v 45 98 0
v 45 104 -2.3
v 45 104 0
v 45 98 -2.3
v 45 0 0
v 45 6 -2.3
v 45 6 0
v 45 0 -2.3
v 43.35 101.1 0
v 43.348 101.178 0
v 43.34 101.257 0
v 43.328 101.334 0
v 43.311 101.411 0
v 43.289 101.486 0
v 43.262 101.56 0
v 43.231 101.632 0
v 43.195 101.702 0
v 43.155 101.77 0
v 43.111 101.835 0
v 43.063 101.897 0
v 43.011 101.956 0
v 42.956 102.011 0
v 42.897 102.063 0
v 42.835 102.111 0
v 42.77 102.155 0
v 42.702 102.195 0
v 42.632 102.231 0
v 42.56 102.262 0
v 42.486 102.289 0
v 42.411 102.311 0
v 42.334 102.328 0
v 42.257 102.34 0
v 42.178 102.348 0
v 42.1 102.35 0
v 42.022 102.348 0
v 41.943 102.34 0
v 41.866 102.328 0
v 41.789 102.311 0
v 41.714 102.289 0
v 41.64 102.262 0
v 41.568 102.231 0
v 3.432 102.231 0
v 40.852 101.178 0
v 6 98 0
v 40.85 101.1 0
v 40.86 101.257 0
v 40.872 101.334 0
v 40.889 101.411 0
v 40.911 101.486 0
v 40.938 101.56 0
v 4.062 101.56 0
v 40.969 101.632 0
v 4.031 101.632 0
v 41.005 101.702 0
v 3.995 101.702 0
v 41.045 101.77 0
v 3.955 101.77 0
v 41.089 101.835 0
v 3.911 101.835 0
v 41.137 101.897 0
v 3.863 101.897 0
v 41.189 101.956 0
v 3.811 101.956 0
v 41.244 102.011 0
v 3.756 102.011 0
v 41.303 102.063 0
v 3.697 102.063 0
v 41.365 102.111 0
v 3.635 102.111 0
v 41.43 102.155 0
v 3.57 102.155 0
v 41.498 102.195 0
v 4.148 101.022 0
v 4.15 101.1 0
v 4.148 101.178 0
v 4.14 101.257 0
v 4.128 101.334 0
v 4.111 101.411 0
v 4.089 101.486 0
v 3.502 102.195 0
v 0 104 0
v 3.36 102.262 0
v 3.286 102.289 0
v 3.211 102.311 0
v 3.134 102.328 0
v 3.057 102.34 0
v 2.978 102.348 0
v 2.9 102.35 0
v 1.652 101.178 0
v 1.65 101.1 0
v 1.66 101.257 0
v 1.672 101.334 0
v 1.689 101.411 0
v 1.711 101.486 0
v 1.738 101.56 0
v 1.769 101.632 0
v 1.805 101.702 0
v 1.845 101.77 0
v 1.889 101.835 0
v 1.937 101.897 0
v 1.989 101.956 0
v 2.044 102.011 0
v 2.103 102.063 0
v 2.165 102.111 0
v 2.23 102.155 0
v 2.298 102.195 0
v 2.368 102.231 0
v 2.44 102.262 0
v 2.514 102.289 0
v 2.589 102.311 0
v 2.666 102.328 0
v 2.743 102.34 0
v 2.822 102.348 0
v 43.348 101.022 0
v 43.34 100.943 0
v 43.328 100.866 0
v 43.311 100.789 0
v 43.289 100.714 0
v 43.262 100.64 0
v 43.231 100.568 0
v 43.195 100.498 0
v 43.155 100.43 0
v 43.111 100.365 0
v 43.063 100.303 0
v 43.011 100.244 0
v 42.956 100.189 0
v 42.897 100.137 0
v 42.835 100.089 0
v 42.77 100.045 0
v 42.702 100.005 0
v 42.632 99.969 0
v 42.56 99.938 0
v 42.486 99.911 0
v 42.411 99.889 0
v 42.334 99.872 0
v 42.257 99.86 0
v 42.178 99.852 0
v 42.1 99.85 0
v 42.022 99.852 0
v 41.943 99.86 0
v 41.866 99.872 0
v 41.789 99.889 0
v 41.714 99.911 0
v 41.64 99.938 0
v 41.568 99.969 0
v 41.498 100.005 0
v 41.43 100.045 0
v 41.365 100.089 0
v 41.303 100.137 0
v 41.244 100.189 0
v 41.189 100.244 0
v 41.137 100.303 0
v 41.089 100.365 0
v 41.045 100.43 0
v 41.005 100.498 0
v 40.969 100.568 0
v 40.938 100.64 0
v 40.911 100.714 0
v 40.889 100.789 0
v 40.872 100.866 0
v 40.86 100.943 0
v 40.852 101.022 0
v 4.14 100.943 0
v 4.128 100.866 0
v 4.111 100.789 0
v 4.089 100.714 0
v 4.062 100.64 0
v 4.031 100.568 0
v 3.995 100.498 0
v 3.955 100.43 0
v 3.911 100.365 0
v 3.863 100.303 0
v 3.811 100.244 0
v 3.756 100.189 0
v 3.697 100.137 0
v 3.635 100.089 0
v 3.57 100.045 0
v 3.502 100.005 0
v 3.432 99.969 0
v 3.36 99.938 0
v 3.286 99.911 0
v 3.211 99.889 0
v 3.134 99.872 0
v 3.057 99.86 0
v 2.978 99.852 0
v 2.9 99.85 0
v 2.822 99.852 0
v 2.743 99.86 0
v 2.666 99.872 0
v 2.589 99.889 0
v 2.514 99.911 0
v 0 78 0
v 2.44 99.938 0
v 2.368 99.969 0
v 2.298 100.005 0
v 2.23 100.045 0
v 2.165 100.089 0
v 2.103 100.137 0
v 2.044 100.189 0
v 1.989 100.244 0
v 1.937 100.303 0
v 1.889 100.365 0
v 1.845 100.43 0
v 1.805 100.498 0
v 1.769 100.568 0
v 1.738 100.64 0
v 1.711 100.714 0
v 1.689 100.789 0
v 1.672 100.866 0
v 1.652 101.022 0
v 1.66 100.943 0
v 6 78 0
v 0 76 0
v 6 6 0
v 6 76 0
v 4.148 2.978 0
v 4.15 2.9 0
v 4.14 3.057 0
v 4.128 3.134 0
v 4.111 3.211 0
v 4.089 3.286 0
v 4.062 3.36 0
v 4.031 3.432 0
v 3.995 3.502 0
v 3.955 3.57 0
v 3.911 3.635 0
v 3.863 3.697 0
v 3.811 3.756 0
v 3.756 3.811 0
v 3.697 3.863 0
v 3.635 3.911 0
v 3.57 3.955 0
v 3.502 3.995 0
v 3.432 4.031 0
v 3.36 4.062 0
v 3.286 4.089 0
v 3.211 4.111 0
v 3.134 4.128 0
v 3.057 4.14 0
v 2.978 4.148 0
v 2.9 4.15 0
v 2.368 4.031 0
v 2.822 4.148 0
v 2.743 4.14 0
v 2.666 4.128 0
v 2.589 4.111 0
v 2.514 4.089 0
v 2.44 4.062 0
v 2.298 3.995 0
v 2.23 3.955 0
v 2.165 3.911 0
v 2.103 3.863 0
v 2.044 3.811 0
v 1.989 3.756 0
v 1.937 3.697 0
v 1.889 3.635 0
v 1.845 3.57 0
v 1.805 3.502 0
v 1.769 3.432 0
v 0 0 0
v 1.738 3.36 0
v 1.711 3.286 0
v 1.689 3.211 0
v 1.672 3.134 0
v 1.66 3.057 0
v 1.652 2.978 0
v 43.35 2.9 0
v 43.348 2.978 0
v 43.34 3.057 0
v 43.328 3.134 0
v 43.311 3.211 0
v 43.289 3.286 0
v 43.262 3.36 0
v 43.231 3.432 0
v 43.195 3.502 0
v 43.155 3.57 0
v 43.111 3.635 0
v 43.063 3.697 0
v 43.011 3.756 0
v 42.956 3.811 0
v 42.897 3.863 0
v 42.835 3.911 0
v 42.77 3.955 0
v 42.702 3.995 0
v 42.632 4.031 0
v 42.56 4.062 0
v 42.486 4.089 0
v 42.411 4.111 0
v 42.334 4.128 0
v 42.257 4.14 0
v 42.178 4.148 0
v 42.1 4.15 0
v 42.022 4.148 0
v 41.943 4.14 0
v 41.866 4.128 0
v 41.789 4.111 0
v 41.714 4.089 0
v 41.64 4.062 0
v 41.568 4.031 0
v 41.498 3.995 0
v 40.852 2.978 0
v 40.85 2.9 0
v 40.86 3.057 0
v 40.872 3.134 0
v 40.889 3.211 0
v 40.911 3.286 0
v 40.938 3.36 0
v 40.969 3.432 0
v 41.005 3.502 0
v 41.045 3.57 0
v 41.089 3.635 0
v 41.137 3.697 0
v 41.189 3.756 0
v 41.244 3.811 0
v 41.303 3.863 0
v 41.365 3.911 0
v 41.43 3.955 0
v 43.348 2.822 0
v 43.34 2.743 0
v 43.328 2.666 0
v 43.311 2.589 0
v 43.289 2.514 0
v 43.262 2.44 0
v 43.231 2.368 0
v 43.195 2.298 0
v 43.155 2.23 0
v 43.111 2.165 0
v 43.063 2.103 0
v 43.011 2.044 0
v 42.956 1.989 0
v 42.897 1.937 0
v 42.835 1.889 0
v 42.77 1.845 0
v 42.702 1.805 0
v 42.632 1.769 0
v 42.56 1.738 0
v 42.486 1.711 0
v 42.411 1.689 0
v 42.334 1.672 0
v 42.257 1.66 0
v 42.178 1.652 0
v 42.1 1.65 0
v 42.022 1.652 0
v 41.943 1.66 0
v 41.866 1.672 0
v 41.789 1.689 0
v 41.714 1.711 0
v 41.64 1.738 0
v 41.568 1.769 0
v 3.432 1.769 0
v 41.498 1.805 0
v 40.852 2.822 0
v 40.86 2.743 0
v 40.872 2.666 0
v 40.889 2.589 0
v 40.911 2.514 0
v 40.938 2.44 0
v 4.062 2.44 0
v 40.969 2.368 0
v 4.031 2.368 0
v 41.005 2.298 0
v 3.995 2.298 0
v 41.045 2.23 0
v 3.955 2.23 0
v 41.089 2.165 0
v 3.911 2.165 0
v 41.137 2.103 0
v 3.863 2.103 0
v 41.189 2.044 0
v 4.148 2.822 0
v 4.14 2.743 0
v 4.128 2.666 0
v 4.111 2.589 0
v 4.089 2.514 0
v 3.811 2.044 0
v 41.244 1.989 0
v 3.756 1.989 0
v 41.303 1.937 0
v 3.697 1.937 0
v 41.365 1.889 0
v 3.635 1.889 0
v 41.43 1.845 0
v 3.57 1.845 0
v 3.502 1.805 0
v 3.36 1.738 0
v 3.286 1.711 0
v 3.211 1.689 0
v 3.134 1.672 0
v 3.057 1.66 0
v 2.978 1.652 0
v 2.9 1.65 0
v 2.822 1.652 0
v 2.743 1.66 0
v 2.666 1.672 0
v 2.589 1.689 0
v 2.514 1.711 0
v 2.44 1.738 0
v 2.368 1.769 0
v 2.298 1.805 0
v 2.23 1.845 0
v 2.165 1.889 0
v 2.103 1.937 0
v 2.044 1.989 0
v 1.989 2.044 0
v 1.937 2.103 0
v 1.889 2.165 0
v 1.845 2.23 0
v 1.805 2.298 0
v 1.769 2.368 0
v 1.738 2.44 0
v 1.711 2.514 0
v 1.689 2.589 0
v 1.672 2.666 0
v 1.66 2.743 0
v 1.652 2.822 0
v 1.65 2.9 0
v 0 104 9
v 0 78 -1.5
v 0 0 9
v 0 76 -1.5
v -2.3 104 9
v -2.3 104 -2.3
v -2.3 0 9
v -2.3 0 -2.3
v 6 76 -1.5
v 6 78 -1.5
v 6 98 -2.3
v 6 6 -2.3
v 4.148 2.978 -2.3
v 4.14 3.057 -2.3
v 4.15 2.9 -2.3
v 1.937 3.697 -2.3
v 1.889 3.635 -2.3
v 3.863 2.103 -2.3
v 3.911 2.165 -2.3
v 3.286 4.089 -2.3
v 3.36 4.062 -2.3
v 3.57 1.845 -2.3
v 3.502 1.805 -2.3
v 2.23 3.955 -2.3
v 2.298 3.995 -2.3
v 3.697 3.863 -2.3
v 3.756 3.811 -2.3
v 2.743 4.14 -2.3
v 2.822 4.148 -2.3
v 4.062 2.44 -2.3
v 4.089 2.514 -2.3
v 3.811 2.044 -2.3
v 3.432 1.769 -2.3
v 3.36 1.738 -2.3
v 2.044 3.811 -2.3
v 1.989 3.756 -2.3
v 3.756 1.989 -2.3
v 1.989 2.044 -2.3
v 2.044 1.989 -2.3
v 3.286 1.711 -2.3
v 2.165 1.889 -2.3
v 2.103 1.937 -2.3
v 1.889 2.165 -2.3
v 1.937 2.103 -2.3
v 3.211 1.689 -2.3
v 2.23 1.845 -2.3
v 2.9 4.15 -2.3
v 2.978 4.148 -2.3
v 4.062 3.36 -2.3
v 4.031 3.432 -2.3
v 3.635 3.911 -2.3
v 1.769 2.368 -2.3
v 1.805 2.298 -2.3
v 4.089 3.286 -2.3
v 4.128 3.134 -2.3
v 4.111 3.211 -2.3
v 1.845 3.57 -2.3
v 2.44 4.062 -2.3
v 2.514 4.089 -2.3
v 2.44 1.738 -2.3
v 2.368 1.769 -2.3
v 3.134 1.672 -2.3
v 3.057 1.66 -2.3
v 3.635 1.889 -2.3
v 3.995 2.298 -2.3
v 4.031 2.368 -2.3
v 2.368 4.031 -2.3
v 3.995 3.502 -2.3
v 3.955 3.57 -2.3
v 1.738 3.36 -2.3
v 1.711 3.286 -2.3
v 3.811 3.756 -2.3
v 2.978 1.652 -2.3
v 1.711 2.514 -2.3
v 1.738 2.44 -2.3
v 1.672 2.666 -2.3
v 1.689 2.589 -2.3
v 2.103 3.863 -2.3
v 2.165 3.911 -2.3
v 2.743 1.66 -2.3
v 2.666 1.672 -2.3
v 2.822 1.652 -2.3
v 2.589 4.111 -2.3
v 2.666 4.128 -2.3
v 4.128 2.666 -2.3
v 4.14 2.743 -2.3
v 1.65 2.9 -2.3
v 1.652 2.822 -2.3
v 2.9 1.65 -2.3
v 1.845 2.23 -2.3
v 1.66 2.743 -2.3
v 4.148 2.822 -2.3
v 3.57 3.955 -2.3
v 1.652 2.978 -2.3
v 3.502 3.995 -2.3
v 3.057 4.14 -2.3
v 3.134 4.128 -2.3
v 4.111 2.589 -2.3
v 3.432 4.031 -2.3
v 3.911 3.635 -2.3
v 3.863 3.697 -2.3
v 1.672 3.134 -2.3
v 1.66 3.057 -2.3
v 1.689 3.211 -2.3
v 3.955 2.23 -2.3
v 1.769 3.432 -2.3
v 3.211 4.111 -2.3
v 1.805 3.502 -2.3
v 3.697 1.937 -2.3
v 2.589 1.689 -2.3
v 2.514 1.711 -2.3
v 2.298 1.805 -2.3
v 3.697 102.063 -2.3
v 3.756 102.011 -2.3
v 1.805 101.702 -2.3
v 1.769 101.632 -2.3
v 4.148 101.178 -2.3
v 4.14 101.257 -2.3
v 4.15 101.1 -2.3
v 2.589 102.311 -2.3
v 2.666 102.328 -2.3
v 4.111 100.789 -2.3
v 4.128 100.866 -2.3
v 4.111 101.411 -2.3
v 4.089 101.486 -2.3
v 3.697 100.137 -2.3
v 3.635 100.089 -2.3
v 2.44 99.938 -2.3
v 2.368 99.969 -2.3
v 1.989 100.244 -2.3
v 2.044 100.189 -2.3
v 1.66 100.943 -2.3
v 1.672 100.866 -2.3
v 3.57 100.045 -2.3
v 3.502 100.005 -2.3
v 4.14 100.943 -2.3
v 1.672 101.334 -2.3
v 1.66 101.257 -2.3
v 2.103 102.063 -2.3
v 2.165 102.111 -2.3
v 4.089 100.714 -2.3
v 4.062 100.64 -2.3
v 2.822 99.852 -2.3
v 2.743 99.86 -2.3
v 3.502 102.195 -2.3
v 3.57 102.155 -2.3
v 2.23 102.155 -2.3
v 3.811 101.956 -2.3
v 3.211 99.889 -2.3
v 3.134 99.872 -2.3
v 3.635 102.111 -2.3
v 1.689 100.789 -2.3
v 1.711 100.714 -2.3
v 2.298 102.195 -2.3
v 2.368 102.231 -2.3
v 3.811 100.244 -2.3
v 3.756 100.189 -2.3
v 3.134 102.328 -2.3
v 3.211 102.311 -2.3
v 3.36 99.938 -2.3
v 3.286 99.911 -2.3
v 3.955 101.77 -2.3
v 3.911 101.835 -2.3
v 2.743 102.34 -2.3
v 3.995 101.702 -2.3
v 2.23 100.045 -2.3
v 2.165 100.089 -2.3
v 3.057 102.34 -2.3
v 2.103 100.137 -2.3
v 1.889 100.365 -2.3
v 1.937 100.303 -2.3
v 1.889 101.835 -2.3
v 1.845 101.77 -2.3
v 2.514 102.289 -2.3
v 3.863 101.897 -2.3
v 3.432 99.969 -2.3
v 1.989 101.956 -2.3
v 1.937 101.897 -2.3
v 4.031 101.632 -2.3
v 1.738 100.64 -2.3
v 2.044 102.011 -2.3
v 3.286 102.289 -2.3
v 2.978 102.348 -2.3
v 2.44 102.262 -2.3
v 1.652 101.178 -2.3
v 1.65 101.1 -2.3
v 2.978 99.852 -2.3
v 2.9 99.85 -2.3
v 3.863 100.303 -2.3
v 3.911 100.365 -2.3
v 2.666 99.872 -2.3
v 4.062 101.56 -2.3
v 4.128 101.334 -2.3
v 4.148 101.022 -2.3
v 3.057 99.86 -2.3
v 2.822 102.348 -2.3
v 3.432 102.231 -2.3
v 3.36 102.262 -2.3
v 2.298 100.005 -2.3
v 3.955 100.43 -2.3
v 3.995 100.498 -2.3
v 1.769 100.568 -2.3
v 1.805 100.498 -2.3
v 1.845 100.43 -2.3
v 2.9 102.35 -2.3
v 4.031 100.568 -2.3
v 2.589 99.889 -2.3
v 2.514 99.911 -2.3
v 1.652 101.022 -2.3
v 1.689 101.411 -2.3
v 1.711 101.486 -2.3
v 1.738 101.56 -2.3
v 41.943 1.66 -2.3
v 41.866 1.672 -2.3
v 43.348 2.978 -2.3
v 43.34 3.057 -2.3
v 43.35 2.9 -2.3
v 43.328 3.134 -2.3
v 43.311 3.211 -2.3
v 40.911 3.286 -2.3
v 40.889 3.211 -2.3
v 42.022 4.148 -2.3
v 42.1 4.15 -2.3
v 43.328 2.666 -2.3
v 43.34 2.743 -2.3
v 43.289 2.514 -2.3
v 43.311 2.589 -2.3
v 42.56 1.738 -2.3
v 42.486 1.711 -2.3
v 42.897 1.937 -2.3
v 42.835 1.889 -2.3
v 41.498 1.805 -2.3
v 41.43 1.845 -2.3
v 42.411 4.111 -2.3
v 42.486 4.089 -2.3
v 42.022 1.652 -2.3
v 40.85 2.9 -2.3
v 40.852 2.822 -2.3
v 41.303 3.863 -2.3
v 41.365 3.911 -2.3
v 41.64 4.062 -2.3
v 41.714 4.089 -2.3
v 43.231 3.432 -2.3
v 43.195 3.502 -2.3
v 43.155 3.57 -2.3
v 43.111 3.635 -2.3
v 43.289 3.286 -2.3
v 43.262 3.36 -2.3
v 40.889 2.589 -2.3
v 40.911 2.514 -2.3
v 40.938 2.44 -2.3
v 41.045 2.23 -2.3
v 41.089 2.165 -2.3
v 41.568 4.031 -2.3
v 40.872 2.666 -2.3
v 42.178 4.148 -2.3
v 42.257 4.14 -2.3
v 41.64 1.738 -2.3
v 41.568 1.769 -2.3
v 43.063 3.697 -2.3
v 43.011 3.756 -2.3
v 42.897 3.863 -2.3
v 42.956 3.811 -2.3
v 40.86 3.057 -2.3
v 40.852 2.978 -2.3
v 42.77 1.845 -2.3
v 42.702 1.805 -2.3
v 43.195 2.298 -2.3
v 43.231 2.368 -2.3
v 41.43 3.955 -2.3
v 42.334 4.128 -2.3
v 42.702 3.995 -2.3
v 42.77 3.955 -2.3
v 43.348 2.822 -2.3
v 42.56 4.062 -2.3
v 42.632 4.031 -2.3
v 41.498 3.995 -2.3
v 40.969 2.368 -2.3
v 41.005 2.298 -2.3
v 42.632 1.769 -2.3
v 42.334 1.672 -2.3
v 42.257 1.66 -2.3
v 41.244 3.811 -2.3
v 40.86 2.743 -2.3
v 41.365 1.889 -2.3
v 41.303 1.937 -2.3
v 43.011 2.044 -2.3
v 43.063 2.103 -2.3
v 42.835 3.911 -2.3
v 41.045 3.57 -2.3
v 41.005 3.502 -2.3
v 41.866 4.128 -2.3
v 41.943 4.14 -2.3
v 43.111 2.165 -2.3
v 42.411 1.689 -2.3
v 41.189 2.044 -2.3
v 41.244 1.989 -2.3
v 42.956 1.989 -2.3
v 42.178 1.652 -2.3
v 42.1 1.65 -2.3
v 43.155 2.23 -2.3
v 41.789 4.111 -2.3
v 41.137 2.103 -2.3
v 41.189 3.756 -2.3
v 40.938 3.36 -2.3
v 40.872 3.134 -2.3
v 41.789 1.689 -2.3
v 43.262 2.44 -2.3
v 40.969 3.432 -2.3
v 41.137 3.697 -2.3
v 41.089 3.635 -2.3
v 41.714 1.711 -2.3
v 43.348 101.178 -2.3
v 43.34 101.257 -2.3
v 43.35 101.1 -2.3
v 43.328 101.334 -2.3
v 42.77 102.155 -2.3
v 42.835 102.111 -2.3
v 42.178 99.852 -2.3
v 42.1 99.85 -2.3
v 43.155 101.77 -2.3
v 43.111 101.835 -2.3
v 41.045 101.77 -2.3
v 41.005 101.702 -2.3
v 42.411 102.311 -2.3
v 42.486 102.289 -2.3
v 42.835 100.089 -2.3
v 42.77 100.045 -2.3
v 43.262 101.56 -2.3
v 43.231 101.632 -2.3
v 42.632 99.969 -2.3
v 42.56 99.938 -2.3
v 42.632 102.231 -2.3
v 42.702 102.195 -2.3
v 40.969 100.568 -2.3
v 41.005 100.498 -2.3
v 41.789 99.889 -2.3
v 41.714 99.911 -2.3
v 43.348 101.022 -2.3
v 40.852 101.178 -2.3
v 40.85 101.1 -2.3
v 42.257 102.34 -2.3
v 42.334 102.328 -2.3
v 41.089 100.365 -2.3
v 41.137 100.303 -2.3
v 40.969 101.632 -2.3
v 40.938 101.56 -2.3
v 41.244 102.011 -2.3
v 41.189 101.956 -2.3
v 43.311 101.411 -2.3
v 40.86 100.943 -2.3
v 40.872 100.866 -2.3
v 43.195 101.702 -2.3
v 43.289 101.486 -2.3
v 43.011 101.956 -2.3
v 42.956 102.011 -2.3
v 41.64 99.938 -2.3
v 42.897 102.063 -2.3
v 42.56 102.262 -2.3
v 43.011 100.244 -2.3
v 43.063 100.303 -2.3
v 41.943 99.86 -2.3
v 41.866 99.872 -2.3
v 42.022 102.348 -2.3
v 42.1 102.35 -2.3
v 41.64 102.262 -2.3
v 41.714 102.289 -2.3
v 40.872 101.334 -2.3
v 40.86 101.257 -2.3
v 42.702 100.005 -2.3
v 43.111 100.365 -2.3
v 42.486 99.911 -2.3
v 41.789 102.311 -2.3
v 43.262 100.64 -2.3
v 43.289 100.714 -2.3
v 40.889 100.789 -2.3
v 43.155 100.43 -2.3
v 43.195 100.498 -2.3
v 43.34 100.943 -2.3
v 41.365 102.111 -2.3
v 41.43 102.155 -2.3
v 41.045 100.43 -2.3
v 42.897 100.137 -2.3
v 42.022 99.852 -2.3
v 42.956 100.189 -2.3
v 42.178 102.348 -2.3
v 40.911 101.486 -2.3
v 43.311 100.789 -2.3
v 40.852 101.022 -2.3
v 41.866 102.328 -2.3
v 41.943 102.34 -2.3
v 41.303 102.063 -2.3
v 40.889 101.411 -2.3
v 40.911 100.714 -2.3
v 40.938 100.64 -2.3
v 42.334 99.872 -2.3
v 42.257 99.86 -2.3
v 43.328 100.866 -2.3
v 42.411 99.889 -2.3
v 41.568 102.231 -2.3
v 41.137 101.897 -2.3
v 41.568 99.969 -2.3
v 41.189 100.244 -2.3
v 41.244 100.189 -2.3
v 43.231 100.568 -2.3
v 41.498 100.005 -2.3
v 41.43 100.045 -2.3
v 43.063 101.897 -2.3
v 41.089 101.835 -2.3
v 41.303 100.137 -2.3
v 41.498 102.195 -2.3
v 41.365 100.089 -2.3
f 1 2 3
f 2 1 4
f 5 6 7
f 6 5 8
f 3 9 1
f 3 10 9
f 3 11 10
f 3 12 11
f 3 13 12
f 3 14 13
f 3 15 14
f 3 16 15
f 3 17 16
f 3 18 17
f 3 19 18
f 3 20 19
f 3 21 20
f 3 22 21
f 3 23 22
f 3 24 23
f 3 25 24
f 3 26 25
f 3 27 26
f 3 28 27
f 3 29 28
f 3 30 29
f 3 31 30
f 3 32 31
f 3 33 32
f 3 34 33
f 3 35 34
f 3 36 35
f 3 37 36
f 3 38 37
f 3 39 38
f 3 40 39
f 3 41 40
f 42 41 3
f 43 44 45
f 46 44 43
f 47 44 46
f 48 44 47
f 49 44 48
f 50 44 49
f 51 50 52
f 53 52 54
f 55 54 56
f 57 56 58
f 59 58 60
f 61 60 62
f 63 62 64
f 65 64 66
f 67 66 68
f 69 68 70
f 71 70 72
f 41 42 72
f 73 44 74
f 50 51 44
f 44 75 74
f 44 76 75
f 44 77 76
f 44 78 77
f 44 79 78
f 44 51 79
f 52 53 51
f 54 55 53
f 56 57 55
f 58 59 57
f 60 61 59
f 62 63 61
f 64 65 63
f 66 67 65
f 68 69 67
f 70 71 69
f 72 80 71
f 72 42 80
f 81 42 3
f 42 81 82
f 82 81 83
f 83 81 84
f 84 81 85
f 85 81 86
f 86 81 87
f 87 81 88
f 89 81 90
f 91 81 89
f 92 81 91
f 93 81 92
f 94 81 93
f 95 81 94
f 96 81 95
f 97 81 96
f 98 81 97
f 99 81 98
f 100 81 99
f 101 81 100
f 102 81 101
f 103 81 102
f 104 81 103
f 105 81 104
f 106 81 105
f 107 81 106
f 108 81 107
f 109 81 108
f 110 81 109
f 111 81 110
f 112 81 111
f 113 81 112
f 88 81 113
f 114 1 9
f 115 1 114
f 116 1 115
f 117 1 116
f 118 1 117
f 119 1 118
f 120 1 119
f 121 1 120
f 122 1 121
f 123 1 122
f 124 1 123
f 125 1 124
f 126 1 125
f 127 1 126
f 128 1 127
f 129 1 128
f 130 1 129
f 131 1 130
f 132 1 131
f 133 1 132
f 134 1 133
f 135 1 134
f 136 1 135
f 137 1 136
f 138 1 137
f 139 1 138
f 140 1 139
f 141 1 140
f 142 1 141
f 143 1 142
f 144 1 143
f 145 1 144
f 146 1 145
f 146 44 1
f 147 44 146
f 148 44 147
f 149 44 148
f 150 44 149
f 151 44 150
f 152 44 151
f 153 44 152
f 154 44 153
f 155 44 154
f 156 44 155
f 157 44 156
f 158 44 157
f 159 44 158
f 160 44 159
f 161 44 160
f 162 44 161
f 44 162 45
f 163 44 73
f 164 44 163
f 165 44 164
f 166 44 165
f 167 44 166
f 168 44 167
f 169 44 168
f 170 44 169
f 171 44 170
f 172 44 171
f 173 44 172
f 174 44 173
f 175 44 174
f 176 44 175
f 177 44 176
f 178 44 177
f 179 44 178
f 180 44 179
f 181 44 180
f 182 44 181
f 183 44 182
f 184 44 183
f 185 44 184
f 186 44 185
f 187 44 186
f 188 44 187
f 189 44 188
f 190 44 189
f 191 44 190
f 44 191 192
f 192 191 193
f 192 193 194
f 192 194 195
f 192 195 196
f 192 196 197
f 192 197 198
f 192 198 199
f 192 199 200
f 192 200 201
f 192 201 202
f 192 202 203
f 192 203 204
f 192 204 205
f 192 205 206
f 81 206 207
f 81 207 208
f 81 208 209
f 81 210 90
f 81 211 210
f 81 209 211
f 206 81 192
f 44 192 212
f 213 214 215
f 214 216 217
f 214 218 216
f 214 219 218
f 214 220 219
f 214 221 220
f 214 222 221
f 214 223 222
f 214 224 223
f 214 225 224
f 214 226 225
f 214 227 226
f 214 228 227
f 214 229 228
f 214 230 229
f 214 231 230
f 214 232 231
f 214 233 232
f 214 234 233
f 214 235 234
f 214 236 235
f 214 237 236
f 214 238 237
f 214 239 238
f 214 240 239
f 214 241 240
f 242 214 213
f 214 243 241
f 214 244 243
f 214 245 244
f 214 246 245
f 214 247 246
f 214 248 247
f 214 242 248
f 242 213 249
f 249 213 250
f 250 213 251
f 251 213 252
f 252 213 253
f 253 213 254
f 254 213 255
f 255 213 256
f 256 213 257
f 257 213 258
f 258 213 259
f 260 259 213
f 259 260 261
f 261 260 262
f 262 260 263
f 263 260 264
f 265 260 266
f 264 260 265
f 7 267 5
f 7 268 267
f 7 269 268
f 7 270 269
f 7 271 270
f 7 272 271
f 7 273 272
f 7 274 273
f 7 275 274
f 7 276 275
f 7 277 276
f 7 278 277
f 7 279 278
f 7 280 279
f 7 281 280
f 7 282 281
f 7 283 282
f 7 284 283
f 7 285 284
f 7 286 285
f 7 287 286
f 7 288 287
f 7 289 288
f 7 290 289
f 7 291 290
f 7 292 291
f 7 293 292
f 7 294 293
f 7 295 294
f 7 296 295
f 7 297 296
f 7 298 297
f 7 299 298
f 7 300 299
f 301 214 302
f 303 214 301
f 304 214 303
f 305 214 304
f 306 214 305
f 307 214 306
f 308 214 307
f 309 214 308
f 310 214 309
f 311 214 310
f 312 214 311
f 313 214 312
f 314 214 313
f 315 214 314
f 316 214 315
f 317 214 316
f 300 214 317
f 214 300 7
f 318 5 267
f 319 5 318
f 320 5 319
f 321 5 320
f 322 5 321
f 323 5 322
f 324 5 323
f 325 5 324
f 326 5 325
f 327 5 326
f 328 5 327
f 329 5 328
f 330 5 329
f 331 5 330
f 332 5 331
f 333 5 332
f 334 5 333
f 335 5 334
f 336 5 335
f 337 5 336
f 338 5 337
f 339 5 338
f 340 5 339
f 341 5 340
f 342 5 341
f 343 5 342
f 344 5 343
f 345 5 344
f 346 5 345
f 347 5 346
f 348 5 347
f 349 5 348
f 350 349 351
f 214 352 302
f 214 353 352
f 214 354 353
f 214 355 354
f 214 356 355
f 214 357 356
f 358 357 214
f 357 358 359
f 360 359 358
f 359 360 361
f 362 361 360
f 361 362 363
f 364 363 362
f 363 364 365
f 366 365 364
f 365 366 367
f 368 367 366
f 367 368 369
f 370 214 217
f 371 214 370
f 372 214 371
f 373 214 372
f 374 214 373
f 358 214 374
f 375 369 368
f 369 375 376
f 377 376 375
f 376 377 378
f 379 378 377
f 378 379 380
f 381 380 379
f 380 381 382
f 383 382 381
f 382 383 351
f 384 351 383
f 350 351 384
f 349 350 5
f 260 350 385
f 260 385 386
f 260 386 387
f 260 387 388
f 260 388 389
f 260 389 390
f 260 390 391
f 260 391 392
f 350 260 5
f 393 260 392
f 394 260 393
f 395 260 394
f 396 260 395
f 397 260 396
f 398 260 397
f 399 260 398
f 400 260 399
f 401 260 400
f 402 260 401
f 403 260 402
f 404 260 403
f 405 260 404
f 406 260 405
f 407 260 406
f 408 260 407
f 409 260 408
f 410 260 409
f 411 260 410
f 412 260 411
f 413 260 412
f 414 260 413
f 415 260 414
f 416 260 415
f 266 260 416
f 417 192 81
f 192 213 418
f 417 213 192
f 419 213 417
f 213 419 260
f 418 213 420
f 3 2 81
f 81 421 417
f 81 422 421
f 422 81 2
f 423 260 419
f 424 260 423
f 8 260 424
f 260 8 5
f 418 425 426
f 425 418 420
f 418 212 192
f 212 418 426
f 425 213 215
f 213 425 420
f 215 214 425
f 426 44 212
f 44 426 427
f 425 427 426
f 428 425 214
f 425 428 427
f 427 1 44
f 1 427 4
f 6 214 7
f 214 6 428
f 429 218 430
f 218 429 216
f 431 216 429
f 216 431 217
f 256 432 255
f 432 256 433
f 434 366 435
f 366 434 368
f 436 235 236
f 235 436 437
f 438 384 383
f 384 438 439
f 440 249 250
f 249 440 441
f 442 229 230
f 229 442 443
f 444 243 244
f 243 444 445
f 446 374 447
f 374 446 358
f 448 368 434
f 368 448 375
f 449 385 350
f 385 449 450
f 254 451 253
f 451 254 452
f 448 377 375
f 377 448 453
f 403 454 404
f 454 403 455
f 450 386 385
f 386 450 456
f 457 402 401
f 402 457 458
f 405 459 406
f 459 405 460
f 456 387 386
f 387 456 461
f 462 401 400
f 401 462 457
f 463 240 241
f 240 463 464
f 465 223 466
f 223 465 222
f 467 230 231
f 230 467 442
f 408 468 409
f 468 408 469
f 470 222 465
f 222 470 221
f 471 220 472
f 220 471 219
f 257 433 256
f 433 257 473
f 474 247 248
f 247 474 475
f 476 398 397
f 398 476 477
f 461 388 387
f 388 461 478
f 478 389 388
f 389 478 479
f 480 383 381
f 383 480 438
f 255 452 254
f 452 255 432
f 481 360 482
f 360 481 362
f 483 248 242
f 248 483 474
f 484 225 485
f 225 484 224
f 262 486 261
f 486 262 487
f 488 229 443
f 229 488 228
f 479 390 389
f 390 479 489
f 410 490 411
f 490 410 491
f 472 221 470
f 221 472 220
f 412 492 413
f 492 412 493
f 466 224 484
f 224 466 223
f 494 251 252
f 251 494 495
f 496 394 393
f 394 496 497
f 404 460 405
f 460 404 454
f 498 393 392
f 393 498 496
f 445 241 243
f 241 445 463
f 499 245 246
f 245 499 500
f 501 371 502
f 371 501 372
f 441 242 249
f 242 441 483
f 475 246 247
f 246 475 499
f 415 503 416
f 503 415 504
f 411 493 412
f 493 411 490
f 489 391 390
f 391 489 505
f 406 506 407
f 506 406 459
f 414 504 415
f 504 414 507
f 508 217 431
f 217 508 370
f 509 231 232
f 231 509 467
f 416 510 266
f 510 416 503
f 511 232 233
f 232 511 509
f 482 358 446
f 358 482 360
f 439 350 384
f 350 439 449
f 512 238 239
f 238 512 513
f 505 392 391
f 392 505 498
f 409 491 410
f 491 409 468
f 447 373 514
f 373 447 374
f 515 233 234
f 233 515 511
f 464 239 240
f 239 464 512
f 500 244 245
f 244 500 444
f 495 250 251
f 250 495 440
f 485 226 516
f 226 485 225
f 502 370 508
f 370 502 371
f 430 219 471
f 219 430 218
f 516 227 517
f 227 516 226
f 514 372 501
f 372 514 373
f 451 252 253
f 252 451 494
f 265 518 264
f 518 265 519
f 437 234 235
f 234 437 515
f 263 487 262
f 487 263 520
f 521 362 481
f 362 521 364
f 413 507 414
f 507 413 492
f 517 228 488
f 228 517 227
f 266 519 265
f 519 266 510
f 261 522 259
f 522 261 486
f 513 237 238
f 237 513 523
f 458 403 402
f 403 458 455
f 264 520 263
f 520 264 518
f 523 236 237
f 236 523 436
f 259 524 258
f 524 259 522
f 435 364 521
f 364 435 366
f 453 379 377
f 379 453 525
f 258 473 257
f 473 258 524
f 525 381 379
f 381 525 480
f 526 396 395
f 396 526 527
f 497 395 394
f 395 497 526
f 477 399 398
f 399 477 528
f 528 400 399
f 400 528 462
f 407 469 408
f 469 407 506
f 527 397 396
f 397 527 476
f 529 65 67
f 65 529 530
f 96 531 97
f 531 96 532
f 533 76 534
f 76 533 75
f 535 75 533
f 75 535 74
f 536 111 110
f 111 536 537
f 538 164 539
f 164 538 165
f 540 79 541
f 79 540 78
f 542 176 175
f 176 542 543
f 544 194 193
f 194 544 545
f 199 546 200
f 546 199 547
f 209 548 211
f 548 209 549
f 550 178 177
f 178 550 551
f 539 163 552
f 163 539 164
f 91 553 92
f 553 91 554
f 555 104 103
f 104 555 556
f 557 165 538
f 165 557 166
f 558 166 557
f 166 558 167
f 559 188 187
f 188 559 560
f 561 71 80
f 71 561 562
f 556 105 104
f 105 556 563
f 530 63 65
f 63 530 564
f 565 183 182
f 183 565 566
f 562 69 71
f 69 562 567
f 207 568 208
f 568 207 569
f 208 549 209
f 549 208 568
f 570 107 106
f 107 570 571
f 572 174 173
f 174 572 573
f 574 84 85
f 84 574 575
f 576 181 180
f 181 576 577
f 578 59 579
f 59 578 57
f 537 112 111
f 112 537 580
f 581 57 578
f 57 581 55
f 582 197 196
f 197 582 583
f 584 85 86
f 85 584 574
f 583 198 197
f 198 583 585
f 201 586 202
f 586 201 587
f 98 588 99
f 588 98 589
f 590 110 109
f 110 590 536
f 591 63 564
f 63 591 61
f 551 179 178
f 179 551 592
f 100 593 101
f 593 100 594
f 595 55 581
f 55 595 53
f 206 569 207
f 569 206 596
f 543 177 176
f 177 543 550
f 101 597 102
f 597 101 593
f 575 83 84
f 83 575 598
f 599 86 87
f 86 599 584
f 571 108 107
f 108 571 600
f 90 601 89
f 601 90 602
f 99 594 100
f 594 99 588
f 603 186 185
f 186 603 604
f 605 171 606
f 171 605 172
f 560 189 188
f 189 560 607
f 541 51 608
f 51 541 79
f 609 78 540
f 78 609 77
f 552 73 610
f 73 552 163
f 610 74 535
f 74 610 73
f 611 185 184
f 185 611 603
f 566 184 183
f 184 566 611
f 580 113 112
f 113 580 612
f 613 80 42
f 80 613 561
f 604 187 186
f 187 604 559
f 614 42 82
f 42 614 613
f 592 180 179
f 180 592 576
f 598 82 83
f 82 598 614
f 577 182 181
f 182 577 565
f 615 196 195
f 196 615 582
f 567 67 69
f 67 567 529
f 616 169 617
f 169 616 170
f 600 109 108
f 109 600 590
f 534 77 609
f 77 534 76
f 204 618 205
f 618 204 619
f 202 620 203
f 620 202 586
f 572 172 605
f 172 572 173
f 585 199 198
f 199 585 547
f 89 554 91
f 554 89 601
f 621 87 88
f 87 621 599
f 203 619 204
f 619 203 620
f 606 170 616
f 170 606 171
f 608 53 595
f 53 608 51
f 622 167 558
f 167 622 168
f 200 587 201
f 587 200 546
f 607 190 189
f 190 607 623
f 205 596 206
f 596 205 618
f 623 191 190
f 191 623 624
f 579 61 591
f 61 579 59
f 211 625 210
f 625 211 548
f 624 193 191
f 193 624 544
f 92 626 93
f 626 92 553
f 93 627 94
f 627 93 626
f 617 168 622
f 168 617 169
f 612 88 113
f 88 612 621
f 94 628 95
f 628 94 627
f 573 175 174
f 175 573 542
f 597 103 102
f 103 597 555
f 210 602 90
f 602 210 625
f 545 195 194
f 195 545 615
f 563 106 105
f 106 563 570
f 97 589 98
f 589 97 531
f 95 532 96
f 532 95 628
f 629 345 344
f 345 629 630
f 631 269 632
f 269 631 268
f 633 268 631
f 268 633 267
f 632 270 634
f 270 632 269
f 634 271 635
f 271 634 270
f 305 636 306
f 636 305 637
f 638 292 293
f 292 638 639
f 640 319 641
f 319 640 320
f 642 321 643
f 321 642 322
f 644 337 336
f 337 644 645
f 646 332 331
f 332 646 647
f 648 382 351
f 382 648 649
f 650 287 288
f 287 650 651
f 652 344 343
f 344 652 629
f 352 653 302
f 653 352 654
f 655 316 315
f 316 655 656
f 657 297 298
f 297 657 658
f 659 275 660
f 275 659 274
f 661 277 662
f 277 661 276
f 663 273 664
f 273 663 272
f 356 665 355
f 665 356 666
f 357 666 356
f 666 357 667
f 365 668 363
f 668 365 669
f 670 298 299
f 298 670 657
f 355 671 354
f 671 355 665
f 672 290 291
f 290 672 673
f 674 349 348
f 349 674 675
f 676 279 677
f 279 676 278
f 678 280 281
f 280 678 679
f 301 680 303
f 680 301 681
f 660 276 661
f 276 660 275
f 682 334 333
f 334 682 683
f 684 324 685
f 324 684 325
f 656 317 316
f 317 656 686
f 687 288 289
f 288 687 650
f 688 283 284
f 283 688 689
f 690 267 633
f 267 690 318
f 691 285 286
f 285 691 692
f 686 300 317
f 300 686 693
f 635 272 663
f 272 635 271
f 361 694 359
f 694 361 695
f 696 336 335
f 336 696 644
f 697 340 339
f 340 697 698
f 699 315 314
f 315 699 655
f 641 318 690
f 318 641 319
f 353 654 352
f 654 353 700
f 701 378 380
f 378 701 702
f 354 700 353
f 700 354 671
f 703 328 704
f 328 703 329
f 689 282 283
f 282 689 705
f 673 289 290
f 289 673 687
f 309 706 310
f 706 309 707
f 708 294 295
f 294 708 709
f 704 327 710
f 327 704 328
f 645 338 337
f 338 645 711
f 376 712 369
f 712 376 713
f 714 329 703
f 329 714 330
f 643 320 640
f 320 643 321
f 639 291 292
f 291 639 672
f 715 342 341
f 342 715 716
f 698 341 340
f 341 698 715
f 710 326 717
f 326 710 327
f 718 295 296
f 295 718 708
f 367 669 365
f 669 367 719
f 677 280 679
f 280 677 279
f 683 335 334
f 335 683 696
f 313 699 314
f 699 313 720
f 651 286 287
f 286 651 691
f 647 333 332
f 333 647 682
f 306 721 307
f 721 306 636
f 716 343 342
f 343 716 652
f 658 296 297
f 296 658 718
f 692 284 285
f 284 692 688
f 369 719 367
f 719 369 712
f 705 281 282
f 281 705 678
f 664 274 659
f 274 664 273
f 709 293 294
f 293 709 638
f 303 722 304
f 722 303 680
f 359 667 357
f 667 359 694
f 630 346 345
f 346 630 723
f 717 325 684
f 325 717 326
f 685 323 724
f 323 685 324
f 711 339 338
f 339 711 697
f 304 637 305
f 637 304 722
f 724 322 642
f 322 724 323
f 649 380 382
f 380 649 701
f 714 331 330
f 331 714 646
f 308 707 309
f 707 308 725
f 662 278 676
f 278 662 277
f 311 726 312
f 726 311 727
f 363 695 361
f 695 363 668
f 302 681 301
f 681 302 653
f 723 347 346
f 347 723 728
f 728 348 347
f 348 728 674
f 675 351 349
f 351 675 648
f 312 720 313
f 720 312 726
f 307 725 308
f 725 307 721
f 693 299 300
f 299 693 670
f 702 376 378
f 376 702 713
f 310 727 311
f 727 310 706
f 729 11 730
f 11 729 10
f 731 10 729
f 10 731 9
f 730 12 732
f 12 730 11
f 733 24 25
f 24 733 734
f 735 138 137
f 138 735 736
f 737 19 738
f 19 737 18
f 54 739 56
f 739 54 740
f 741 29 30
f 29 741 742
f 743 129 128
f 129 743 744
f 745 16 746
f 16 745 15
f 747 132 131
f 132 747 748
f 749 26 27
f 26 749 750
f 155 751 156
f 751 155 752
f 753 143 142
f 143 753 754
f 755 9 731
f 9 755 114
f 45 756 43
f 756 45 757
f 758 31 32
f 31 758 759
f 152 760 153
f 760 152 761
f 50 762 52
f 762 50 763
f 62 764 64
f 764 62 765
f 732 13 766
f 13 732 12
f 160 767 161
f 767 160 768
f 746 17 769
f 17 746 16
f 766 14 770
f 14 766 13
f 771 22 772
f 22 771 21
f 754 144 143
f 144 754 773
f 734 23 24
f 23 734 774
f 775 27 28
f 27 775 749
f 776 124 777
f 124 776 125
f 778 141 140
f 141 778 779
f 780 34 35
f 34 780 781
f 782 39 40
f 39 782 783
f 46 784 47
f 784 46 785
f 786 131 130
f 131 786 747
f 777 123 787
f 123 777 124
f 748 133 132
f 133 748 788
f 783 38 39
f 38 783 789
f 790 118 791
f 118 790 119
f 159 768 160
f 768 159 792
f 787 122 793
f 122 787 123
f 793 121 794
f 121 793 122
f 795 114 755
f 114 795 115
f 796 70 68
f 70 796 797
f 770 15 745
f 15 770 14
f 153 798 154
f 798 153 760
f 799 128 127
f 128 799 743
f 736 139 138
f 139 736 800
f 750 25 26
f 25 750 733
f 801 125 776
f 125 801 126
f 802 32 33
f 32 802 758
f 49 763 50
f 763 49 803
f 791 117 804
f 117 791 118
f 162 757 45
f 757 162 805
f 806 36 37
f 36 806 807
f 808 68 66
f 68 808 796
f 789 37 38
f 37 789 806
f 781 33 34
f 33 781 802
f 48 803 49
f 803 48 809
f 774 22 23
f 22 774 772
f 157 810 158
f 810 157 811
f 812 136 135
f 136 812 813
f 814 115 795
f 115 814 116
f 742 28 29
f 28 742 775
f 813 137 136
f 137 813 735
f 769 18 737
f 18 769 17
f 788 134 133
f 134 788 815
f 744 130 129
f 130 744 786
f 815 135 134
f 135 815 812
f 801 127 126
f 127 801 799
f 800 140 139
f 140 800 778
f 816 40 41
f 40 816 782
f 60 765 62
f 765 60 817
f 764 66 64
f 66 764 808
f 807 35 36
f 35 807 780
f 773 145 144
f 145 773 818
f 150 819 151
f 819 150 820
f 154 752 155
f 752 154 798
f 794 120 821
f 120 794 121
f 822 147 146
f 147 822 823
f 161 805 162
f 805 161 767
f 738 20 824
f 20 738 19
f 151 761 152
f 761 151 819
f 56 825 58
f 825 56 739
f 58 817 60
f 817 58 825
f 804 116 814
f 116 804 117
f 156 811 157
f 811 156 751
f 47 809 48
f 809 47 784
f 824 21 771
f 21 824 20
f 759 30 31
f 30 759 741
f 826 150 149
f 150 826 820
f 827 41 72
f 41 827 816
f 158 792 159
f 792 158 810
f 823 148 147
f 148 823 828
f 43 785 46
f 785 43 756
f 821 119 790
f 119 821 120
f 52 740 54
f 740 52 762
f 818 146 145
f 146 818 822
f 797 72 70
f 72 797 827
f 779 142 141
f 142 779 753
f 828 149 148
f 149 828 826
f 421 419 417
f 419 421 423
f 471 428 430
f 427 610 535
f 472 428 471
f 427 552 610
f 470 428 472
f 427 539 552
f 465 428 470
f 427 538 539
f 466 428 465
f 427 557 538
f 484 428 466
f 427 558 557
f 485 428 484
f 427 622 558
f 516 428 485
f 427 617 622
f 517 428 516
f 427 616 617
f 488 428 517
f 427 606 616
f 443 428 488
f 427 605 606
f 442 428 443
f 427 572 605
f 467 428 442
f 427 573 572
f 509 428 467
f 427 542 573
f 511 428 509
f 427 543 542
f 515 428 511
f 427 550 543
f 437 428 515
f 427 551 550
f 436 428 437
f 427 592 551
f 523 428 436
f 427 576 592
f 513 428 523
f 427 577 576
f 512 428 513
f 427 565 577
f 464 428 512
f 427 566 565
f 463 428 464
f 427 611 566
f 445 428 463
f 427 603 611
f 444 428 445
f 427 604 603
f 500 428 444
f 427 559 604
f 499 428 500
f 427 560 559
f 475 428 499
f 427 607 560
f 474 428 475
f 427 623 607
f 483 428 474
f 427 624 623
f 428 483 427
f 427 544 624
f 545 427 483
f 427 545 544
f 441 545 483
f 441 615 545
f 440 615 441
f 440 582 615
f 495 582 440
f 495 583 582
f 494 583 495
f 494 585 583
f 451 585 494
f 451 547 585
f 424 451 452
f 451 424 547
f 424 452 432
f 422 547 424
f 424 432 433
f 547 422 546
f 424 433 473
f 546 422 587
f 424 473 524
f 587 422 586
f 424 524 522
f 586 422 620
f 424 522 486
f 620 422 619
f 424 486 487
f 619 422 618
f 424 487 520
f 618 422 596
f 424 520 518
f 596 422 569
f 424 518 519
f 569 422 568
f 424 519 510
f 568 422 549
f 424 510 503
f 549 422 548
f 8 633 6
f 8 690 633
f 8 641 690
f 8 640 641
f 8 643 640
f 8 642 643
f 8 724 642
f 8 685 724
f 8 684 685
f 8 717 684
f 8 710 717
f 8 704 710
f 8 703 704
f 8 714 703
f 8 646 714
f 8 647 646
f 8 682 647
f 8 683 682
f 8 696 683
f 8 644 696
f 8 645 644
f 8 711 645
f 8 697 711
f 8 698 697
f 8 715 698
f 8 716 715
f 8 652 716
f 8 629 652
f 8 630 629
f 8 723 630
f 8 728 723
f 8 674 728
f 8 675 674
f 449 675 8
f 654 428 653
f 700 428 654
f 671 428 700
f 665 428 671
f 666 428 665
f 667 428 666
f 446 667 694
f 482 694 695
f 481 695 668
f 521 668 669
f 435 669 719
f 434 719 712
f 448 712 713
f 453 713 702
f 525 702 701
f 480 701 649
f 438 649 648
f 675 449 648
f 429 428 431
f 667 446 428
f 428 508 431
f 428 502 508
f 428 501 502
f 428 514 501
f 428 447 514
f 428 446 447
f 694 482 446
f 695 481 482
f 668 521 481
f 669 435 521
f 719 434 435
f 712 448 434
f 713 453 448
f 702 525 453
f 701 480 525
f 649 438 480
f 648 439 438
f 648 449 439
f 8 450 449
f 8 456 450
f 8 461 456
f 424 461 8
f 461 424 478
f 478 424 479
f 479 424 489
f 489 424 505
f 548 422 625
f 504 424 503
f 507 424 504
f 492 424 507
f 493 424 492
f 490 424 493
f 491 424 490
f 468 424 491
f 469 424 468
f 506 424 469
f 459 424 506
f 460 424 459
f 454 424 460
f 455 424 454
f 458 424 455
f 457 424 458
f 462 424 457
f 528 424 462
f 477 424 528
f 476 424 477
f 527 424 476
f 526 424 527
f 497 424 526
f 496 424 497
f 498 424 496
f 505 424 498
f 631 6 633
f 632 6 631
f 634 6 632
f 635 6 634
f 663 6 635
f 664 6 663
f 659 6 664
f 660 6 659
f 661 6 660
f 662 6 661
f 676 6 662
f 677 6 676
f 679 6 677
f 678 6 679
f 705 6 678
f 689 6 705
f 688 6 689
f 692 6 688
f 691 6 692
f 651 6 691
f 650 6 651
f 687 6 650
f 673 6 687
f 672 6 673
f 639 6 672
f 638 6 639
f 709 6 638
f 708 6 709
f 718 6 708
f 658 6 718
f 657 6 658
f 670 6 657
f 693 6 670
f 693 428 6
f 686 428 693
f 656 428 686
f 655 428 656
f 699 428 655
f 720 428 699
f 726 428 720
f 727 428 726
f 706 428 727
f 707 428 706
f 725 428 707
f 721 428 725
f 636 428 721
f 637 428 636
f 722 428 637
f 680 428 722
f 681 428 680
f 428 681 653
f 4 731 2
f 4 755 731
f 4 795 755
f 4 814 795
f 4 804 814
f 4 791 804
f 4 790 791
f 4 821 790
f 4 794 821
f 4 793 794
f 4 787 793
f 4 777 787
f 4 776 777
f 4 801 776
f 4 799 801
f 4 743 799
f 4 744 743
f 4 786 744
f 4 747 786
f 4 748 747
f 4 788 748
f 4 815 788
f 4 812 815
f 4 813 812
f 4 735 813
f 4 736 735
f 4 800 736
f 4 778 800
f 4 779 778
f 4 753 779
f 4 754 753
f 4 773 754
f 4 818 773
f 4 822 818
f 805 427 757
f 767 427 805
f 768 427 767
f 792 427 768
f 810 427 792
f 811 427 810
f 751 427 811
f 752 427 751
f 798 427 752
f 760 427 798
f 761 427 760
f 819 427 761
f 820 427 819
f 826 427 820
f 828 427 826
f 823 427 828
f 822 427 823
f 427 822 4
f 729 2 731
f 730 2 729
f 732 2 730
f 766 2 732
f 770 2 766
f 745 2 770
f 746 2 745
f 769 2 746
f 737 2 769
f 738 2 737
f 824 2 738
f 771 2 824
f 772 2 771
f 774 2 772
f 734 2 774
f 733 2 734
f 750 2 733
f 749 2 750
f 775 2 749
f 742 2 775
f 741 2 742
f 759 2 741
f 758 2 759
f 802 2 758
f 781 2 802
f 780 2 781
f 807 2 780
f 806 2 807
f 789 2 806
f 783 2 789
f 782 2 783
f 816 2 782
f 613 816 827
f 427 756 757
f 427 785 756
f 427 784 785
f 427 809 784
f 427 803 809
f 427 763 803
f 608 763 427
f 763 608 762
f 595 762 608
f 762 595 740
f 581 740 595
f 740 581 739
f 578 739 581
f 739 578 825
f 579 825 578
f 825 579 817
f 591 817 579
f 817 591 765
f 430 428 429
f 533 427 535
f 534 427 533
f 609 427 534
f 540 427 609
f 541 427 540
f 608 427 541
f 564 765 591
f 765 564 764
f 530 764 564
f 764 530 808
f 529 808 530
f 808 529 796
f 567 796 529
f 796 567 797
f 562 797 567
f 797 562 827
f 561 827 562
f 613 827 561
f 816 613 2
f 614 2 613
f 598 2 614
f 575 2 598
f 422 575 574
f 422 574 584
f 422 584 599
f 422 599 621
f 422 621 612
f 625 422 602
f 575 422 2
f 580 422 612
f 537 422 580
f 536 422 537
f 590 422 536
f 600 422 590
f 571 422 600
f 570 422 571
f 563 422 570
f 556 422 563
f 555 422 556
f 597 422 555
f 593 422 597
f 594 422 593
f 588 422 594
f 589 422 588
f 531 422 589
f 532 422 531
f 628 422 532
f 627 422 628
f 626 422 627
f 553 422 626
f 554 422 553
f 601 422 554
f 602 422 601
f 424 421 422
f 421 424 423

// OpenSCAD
$fn=100;
carte_largeur =45; 
carte_longueur=104;
carte_delta_vis=2.9;

epaisseur_plaque = 2.3;
hauteur_support  = 9;
largeur_support  = 6;

module vis_carte() {
    cylinder(d=2.5, h=20, center=true);
}
module carte() {
    cube([carte_largeur, carte_longueur,100]);
    translate([0,76,-1.5])
        cube([carte_largeur,2,2]);
    translate([largeur_support,largeur_support,-epaisseur_plaque-0.1])
        cube([carte_largeur  -   largeur_support,
              carte_longueur - 2*largeur_support,5]);
    //Vis
    translate([carte_delta_vis,carte_delta_vis])
        vis_carte();
    translate([carte_delta_vis,carte_longueur-carte_delta_vis])
        vis_carte();
    translate([carte_largeur-carte_delta_vis,carte_delta_vis])
        vis_carte();
    translate([carte_largeur-carte_delta_vis,carte_longueur-carte_delta_vis])
        vis_carte();
}
difference() {
    translate([-epaisseur_plaque,0,-epaisseur_plaque])
        cube([carte_largeur + epaisseur_plaque,
              carte_longueur,
              epaisseur_plaque + hauteur_support]);
    carte();
}
